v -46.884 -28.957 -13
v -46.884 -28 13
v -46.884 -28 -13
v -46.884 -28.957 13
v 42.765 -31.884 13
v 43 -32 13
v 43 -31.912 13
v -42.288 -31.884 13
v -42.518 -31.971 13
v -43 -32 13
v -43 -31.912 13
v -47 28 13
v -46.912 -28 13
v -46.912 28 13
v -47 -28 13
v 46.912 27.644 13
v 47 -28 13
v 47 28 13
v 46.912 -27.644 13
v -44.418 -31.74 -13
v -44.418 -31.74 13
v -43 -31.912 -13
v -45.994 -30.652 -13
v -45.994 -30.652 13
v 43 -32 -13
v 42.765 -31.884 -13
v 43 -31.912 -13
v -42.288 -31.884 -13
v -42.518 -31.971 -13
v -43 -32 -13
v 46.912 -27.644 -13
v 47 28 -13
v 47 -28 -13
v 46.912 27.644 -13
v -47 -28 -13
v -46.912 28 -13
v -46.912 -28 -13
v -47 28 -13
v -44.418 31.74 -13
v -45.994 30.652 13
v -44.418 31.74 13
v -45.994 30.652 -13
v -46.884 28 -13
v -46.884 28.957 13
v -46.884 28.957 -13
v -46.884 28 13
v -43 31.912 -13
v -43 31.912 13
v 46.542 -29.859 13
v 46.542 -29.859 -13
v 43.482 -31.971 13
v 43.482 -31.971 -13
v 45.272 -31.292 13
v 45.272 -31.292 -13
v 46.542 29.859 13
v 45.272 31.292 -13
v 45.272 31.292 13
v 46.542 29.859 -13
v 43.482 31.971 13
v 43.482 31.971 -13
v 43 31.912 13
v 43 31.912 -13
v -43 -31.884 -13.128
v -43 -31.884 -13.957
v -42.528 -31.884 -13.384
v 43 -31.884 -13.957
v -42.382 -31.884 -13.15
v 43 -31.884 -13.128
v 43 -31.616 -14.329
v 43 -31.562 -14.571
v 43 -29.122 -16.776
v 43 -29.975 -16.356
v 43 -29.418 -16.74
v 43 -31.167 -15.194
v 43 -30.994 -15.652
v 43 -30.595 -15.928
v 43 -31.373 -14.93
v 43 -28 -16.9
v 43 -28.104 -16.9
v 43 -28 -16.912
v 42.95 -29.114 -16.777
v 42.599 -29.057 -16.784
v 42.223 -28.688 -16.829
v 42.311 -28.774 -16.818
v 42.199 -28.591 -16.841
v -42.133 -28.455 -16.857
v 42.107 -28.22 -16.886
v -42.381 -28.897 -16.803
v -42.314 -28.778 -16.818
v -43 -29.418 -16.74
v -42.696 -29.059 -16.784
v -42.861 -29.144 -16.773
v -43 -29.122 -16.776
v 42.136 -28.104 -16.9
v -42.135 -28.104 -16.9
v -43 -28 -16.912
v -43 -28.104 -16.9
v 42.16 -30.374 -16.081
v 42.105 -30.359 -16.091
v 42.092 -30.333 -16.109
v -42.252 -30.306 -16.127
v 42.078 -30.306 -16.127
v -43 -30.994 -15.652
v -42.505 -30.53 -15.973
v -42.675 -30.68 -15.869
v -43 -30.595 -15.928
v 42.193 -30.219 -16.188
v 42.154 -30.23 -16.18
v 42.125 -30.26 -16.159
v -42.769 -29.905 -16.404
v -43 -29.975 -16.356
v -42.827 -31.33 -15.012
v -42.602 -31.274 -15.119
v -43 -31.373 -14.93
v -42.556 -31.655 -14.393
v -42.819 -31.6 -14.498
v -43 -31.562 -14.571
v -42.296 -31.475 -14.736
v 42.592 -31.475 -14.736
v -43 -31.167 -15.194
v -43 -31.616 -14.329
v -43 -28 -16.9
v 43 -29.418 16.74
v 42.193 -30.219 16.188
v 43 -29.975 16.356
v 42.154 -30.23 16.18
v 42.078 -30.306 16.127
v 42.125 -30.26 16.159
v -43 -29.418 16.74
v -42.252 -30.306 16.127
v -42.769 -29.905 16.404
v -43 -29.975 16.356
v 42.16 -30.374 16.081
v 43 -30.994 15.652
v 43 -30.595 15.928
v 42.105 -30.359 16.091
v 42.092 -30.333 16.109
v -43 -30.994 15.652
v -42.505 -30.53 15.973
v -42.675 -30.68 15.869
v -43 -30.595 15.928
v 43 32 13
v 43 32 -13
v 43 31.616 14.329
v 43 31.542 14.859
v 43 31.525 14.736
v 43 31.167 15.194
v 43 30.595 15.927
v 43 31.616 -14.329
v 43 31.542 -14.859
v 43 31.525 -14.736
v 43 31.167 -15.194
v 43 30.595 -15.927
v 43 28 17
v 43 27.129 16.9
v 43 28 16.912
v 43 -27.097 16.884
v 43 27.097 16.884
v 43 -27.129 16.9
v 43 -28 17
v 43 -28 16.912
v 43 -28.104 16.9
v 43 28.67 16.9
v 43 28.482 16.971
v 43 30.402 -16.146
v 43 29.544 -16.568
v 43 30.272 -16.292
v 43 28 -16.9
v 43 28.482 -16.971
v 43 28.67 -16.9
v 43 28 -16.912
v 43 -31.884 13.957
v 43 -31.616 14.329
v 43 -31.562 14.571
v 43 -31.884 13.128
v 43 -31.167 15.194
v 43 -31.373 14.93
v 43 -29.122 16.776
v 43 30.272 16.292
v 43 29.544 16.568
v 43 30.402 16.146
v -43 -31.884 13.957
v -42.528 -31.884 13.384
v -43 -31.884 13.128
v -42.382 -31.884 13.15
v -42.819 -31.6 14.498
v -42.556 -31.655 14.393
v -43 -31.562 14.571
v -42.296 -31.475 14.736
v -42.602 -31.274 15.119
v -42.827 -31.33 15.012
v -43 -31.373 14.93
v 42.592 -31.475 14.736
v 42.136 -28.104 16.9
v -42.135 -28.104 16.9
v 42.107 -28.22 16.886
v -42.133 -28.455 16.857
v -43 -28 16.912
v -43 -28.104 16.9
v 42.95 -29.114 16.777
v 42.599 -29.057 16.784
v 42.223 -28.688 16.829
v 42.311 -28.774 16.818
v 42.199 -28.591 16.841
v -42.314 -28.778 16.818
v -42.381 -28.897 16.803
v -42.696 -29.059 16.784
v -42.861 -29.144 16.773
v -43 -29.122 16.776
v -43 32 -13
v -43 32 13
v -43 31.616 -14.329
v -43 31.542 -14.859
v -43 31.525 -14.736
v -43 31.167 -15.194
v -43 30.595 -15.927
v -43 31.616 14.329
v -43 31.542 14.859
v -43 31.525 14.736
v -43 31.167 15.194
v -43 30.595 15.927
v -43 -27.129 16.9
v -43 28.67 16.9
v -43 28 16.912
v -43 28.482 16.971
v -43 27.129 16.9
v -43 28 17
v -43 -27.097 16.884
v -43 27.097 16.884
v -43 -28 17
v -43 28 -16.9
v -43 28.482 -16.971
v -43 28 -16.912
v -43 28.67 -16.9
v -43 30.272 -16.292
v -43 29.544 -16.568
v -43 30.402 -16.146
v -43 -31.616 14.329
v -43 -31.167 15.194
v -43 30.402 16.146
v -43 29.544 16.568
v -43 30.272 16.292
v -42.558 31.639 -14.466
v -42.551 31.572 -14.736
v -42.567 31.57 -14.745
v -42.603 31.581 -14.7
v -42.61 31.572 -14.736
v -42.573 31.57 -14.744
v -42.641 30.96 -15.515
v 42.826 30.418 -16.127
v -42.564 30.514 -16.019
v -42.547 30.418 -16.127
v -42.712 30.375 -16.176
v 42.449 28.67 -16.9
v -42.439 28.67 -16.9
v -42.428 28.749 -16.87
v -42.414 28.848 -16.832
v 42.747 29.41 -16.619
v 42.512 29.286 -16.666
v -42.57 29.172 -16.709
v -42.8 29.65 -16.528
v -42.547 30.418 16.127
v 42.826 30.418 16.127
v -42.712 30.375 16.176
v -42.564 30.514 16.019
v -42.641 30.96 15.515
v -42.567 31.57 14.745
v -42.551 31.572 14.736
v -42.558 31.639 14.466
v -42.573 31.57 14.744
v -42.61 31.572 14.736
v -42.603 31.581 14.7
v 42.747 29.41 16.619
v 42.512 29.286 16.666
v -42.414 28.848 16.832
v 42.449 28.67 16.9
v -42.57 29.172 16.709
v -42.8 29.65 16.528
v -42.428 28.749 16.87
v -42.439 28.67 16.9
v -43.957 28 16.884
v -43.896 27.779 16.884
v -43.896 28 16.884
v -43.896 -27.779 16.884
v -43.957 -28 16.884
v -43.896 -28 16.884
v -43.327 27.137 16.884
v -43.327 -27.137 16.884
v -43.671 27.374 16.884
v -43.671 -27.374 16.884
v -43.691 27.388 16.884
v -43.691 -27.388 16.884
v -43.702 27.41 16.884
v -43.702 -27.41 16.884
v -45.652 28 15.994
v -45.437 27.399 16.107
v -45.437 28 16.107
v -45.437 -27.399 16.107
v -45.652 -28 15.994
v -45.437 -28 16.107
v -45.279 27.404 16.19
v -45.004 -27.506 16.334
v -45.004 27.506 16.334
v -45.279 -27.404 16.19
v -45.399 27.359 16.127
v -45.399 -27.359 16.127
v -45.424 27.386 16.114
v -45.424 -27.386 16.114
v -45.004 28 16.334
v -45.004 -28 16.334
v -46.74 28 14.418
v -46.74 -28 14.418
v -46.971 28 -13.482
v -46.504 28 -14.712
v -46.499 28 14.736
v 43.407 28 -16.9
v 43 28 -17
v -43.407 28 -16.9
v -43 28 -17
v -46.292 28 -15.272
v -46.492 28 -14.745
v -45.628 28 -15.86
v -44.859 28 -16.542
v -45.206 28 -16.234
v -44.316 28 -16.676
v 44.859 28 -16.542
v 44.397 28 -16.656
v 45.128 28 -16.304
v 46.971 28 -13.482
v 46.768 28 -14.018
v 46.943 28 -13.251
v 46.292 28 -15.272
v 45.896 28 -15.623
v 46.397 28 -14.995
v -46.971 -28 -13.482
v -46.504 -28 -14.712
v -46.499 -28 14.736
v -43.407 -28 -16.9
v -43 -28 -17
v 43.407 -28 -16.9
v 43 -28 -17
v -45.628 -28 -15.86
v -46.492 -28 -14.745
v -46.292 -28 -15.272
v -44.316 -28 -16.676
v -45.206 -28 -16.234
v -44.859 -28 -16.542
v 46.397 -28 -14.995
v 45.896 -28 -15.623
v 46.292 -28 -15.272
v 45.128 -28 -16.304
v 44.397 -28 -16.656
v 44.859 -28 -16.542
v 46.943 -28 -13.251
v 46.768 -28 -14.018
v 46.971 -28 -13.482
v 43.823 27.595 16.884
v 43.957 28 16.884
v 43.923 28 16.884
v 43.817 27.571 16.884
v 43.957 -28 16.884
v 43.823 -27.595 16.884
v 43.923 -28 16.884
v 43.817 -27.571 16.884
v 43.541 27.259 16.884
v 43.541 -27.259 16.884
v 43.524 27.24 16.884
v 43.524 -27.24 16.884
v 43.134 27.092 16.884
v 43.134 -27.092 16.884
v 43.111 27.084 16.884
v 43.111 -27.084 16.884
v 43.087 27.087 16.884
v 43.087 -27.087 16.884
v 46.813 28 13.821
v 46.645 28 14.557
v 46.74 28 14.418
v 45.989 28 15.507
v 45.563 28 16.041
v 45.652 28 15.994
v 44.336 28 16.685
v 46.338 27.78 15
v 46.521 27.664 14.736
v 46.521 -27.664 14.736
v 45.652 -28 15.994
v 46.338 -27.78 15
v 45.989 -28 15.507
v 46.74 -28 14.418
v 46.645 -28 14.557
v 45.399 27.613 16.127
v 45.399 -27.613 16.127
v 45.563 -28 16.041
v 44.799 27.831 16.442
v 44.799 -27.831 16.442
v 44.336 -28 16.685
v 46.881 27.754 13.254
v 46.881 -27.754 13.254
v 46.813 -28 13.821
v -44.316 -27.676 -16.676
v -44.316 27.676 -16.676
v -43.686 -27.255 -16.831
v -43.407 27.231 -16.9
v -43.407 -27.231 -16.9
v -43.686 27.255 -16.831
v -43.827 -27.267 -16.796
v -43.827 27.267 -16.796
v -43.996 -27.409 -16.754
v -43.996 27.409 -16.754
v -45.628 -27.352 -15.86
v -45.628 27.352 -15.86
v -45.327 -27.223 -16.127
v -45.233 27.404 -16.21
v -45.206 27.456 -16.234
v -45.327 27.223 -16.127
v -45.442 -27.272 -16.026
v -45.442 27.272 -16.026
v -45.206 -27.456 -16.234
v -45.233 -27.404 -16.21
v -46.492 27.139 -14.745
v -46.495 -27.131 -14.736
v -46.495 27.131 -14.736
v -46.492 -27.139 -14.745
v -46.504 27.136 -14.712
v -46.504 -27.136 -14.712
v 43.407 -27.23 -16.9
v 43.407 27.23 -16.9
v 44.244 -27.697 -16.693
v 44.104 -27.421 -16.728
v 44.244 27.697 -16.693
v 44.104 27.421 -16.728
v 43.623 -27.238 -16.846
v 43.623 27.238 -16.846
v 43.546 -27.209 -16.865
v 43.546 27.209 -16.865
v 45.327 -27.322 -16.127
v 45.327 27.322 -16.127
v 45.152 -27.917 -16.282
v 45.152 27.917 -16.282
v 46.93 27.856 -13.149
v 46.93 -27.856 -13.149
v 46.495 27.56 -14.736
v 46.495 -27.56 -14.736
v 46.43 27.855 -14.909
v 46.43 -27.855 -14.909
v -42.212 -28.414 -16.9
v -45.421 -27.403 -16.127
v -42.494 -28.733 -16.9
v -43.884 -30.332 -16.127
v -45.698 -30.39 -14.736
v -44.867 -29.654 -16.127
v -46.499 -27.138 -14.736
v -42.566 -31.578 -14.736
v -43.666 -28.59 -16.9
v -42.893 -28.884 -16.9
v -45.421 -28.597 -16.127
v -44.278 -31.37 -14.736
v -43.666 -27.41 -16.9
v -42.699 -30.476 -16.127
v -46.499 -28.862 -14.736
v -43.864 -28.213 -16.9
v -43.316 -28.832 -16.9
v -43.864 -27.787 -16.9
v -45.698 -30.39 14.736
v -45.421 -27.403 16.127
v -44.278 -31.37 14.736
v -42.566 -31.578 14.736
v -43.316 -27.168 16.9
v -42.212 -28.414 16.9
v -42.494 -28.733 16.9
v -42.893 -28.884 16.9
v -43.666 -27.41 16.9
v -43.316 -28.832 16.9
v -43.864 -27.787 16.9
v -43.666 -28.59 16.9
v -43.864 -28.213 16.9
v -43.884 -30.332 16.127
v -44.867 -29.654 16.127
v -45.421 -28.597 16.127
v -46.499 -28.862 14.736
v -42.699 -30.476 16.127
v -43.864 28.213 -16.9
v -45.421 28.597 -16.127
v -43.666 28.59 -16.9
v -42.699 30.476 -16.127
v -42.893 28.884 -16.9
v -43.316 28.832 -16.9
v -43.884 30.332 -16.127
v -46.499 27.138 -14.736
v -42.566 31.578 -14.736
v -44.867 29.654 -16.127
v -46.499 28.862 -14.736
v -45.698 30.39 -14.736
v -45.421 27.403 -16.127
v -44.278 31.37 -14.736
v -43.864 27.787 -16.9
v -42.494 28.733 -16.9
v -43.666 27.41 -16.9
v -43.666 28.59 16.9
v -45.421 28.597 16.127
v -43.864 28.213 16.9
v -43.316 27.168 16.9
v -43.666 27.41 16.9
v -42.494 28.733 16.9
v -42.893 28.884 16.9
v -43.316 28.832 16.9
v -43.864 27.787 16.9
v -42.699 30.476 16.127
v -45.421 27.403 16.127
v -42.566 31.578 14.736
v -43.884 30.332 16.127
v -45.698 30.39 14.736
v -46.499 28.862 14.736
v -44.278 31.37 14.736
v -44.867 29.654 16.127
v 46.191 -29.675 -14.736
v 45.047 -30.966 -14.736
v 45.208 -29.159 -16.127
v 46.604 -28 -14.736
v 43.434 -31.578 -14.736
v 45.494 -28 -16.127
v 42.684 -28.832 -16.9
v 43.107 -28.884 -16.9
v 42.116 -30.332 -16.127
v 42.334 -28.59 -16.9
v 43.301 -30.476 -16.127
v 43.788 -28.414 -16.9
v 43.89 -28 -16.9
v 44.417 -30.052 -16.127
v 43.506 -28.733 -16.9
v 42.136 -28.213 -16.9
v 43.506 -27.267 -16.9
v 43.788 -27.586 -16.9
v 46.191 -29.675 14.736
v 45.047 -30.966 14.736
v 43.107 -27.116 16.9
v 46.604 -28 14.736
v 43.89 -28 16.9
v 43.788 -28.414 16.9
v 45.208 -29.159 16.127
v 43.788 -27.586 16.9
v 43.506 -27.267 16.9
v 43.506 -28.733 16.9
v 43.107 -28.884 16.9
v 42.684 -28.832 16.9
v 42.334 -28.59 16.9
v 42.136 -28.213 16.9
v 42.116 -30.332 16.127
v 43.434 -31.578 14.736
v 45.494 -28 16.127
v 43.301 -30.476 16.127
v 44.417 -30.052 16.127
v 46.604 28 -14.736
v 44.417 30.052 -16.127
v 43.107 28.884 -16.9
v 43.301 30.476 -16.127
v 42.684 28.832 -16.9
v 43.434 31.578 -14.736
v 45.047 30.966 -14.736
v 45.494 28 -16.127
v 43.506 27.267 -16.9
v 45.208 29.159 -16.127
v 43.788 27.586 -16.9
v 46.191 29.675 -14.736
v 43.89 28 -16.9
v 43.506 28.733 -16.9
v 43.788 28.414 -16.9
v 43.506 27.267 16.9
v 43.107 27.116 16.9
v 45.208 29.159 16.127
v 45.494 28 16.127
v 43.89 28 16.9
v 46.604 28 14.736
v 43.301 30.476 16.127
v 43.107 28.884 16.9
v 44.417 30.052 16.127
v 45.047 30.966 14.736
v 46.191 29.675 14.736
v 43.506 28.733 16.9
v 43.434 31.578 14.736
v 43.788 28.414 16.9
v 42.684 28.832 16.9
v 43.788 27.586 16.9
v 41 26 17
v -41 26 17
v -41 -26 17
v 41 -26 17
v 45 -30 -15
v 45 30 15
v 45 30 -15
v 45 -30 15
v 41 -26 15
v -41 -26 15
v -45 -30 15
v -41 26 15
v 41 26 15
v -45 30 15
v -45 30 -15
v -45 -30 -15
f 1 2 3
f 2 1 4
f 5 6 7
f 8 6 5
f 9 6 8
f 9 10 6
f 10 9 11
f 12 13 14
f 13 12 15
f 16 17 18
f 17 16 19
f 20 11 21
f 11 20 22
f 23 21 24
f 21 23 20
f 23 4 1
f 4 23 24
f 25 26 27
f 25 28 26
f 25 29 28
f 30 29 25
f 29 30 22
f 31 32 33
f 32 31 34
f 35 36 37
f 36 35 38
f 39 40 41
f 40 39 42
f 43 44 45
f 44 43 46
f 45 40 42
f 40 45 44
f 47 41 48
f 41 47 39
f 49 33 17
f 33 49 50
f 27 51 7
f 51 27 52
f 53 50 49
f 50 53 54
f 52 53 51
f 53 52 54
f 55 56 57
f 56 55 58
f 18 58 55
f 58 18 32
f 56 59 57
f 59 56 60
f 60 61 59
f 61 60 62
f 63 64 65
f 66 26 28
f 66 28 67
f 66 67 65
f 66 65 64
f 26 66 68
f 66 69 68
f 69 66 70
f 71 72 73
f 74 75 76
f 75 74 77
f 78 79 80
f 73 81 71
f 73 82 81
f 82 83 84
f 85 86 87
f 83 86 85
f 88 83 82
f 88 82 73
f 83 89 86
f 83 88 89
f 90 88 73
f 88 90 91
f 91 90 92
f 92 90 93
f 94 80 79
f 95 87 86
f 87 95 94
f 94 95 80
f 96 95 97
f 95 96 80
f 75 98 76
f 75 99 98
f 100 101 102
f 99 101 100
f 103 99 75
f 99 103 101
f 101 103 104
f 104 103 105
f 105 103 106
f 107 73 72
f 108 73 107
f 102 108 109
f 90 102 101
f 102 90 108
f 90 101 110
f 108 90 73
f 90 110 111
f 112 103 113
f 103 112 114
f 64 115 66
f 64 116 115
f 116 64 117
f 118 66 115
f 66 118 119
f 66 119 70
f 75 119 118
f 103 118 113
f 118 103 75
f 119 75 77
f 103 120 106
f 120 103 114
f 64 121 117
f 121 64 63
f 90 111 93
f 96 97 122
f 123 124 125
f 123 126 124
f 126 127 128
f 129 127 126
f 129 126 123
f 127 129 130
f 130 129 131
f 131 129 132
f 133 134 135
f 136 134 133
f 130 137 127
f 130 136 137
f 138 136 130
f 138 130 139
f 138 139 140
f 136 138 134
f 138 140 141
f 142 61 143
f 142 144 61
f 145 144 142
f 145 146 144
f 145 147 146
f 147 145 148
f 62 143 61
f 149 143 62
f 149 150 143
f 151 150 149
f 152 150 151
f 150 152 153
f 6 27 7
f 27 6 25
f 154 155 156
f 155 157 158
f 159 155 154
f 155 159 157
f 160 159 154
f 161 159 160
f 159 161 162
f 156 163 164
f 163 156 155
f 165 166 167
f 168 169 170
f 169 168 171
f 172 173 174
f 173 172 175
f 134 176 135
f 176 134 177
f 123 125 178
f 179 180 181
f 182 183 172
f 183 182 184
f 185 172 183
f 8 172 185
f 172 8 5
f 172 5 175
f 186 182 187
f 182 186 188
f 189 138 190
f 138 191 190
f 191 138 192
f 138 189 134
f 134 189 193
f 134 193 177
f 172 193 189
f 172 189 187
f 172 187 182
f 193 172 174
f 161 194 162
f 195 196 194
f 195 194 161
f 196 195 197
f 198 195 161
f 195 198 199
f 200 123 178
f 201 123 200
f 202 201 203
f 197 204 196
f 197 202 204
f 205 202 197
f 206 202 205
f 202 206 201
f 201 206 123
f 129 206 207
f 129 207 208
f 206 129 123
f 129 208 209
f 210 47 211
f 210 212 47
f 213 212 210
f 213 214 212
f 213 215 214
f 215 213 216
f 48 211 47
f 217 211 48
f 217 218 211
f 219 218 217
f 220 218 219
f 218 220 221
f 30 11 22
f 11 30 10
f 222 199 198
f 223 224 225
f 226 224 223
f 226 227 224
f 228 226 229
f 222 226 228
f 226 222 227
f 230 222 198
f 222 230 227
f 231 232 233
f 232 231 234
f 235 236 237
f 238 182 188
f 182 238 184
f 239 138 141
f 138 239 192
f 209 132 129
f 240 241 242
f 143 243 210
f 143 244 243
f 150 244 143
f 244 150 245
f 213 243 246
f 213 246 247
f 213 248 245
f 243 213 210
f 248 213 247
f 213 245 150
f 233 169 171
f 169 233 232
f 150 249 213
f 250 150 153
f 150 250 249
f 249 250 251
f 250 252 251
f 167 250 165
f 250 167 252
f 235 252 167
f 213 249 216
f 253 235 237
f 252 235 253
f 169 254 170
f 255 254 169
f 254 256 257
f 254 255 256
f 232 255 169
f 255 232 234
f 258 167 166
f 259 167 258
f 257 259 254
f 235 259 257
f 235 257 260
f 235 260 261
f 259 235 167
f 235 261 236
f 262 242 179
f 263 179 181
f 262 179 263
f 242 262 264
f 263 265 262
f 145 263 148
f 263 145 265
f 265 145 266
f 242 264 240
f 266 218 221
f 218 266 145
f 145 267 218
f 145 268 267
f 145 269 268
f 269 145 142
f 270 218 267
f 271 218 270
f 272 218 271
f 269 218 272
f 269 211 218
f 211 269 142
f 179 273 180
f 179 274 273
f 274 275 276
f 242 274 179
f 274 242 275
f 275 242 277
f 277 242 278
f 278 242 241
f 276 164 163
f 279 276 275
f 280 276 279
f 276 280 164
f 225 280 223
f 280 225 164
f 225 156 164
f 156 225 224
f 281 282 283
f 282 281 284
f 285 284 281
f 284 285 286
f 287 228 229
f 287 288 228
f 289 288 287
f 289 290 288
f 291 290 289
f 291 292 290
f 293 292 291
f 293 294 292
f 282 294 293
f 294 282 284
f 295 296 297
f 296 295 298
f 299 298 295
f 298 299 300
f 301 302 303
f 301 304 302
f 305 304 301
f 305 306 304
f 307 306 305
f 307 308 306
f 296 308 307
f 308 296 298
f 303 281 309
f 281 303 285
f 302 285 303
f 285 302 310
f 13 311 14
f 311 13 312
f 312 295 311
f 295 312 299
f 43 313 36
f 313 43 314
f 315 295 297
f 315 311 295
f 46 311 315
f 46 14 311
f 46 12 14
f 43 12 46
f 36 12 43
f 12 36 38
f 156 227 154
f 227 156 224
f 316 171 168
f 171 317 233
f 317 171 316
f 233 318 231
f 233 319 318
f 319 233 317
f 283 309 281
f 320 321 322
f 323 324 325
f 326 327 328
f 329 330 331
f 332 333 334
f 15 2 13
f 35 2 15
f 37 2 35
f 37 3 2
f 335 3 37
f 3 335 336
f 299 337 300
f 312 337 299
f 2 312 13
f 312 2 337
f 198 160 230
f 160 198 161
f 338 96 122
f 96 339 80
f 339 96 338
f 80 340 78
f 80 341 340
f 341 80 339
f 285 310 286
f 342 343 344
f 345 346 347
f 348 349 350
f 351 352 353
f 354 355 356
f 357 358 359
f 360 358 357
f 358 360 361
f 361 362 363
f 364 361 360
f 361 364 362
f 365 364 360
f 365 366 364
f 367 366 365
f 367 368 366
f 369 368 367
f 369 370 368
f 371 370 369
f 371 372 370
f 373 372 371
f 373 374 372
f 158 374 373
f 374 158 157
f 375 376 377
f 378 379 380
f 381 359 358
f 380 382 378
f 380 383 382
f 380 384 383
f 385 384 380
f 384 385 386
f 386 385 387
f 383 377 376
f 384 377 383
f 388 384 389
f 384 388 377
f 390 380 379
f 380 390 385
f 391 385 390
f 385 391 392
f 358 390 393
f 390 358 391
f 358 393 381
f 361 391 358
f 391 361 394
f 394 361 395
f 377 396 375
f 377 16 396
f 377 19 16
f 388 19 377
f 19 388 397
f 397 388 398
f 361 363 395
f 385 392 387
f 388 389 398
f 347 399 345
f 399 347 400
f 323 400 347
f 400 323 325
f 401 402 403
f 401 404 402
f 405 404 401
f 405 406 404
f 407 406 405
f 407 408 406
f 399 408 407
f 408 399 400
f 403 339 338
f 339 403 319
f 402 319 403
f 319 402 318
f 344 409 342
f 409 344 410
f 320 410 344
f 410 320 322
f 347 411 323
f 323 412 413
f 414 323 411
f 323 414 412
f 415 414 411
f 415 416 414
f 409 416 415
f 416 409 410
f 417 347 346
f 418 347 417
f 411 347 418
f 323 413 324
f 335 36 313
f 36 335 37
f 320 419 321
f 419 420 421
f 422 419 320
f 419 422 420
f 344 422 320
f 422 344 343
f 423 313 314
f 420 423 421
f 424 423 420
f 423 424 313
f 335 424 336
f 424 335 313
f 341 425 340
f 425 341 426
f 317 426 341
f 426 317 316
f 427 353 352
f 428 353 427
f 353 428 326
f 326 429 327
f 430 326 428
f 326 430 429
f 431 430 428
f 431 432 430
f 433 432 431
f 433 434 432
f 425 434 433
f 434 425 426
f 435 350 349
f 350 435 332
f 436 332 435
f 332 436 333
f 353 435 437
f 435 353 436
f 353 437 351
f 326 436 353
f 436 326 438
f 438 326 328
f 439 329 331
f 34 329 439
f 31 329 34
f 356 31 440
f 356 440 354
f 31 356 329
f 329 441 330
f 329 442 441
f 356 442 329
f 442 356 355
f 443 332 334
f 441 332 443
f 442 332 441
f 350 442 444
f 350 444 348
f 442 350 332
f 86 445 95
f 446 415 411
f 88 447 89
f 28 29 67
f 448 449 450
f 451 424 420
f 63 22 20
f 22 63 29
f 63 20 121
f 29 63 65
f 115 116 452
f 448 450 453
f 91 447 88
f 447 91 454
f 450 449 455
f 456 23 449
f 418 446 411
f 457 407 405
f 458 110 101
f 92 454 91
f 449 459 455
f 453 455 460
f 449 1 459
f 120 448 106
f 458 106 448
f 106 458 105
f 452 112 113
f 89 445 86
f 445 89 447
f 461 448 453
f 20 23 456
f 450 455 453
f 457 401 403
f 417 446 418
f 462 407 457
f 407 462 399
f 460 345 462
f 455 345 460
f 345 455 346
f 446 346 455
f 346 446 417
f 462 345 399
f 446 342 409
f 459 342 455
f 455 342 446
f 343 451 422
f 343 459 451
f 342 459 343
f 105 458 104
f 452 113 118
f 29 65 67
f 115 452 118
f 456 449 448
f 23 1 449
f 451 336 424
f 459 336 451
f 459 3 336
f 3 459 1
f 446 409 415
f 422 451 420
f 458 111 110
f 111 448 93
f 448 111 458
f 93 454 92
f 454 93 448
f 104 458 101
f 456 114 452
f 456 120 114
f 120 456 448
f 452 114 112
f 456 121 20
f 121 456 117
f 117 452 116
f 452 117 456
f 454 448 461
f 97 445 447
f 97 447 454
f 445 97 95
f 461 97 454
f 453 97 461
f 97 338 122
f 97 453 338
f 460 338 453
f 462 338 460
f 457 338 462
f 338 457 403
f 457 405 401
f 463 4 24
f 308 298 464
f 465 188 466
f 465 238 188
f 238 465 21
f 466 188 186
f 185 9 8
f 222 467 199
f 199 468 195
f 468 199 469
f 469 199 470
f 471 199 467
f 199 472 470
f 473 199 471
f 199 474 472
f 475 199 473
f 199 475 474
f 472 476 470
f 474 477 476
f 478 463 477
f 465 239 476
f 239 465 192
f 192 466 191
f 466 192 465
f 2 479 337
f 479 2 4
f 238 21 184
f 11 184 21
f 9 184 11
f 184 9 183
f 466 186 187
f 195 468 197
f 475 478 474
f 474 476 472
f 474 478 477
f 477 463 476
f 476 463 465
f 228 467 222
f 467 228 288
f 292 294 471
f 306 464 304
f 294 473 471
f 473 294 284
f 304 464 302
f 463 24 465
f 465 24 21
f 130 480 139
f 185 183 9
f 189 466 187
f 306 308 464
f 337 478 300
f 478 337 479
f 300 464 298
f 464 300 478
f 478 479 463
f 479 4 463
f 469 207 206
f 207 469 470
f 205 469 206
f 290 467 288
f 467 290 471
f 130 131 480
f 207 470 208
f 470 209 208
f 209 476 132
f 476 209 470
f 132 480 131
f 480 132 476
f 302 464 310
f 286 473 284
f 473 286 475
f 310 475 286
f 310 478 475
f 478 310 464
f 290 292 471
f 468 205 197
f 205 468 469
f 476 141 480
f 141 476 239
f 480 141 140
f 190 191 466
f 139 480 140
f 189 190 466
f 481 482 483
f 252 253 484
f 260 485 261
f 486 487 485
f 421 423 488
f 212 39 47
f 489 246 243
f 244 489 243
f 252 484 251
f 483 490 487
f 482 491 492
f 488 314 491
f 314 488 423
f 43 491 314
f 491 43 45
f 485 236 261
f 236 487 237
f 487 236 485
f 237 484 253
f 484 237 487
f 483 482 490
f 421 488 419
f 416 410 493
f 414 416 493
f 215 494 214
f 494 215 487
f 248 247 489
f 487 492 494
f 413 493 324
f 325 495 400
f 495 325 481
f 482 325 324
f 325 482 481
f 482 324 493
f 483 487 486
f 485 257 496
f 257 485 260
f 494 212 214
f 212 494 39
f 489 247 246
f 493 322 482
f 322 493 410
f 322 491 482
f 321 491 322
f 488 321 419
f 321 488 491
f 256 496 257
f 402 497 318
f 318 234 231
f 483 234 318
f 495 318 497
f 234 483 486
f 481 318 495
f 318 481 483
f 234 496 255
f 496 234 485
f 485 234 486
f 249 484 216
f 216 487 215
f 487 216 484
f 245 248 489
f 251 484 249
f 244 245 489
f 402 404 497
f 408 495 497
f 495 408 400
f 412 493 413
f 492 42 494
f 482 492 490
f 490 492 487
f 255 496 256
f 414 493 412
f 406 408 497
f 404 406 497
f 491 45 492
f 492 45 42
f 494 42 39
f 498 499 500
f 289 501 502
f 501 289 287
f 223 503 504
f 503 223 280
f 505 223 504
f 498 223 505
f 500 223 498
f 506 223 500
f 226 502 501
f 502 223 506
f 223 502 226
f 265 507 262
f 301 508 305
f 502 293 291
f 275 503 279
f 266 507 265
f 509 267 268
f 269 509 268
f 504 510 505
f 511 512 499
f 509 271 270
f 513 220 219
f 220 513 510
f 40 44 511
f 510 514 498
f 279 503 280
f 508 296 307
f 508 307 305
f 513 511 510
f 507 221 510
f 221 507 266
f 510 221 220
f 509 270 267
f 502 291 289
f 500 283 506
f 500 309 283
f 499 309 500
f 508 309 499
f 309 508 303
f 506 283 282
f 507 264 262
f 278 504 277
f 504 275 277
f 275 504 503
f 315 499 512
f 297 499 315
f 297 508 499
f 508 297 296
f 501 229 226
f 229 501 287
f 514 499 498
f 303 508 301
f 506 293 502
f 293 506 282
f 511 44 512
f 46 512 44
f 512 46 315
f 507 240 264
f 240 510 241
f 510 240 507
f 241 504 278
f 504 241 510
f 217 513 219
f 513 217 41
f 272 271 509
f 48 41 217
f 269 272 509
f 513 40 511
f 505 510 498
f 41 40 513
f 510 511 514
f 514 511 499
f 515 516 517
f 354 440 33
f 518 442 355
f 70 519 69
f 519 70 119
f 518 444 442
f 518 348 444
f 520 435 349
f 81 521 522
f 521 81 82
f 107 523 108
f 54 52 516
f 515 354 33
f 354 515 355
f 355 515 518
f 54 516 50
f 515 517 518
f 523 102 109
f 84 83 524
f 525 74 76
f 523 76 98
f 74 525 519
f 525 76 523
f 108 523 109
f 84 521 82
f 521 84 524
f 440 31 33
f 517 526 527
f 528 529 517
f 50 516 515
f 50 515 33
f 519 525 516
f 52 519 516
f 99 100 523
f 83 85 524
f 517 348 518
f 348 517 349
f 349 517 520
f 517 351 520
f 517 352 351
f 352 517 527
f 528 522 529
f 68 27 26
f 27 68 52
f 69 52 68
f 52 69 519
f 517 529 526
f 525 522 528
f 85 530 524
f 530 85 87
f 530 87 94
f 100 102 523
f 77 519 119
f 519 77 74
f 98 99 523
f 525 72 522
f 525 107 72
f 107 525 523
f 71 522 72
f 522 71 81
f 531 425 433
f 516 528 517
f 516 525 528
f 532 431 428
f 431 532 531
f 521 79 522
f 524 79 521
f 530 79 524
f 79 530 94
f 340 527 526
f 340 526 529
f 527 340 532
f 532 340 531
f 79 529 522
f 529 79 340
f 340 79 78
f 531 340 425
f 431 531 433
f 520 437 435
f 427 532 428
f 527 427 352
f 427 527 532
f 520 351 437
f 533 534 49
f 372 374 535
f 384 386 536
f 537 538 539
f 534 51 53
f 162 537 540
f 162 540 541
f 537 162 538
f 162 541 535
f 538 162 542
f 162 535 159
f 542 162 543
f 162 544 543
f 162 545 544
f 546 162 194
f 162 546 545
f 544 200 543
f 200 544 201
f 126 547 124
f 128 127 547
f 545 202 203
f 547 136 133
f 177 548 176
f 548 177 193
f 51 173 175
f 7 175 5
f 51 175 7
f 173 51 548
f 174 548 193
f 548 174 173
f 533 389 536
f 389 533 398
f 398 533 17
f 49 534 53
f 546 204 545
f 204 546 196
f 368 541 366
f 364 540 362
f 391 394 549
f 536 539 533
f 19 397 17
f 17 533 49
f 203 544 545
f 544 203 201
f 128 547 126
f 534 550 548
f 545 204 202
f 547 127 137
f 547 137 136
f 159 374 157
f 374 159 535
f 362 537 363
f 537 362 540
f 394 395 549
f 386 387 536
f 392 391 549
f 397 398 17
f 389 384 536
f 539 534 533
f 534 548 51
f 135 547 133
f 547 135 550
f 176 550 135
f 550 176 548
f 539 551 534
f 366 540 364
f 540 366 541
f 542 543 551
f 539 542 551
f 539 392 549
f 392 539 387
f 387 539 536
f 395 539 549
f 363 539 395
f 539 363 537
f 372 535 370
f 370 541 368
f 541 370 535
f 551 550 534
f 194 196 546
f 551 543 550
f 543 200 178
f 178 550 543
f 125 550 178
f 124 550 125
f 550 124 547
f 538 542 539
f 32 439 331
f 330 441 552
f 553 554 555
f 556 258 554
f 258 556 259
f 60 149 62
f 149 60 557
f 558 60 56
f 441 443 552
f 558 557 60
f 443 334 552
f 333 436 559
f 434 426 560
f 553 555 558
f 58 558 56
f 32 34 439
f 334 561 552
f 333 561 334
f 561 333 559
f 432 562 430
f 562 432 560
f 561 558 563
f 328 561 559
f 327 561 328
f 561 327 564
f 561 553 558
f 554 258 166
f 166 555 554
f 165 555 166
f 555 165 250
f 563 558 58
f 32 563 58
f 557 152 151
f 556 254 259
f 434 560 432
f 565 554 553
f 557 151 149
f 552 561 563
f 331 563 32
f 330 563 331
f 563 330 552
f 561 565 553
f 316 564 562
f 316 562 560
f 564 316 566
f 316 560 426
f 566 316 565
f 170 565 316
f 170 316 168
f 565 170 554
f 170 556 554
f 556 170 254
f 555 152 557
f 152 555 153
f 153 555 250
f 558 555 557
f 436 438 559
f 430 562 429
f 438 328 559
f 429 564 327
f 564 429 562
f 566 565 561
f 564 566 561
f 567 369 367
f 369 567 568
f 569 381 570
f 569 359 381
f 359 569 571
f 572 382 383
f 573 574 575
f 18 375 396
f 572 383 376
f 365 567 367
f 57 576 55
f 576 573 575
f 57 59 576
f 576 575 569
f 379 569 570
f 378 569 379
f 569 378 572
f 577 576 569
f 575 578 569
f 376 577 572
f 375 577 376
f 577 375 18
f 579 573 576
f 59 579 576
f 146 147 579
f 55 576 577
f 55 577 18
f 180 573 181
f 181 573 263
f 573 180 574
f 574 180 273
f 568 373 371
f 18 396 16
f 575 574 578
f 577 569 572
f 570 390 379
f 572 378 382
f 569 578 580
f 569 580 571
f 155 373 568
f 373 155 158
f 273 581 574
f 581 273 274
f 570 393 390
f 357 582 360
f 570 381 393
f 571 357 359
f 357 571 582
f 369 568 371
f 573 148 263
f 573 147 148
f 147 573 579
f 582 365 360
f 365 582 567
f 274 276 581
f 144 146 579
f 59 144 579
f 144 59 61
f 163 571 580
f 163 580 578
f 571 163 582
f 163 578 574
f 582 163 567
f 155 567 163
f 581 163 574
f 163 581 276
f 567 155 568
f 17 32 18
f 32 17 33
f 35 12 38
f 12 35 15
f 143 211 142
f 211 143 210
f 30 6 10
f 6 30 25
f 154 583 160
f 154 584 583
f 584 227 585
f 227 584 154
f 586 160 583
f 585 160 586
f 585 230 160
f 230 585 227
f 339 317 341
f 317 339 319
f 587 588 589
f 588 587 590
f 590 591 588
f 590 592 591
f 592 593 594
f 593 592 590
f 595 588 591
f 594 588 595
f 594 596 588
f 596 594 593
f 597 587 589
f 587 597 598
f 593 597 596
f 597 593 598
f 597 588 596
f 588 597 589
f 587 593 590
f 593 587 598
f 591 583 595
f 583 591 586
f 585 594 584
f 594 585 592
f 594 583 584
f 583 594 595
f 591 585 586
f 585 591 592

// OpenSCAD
use <MCAD/boxes.scad>

//Size of the object to be encased
$objectWidth = 90;
$objectHeight = 60;
$objectDepth = 30;

//Case parameters
$caseThick = 2;
$edgeThick = 2;
$xEdgeSize = 4;
$yEdgeSize = 4;
$rounding = 4;

difference(){
roundedBox([$objectWidth + $caseThick * 2,
$objectHeight + $caseThick * 2,
$objectDepth + $caseThick * 2], radius=$rounding);

cube([$objectWidth,
$objectHeight,
$objectDepth], center=true);

translate([0, 0, $objectDepth/2 + $caseThick])
cube([$objectWidth - $xEdgeSize*2,
$objectHeight - $yEdgeSize*2,
$edgeThick * 2 + 0.1], center=true);
} //We add a small amount of extra space to fix coplanar boolean issues. 
